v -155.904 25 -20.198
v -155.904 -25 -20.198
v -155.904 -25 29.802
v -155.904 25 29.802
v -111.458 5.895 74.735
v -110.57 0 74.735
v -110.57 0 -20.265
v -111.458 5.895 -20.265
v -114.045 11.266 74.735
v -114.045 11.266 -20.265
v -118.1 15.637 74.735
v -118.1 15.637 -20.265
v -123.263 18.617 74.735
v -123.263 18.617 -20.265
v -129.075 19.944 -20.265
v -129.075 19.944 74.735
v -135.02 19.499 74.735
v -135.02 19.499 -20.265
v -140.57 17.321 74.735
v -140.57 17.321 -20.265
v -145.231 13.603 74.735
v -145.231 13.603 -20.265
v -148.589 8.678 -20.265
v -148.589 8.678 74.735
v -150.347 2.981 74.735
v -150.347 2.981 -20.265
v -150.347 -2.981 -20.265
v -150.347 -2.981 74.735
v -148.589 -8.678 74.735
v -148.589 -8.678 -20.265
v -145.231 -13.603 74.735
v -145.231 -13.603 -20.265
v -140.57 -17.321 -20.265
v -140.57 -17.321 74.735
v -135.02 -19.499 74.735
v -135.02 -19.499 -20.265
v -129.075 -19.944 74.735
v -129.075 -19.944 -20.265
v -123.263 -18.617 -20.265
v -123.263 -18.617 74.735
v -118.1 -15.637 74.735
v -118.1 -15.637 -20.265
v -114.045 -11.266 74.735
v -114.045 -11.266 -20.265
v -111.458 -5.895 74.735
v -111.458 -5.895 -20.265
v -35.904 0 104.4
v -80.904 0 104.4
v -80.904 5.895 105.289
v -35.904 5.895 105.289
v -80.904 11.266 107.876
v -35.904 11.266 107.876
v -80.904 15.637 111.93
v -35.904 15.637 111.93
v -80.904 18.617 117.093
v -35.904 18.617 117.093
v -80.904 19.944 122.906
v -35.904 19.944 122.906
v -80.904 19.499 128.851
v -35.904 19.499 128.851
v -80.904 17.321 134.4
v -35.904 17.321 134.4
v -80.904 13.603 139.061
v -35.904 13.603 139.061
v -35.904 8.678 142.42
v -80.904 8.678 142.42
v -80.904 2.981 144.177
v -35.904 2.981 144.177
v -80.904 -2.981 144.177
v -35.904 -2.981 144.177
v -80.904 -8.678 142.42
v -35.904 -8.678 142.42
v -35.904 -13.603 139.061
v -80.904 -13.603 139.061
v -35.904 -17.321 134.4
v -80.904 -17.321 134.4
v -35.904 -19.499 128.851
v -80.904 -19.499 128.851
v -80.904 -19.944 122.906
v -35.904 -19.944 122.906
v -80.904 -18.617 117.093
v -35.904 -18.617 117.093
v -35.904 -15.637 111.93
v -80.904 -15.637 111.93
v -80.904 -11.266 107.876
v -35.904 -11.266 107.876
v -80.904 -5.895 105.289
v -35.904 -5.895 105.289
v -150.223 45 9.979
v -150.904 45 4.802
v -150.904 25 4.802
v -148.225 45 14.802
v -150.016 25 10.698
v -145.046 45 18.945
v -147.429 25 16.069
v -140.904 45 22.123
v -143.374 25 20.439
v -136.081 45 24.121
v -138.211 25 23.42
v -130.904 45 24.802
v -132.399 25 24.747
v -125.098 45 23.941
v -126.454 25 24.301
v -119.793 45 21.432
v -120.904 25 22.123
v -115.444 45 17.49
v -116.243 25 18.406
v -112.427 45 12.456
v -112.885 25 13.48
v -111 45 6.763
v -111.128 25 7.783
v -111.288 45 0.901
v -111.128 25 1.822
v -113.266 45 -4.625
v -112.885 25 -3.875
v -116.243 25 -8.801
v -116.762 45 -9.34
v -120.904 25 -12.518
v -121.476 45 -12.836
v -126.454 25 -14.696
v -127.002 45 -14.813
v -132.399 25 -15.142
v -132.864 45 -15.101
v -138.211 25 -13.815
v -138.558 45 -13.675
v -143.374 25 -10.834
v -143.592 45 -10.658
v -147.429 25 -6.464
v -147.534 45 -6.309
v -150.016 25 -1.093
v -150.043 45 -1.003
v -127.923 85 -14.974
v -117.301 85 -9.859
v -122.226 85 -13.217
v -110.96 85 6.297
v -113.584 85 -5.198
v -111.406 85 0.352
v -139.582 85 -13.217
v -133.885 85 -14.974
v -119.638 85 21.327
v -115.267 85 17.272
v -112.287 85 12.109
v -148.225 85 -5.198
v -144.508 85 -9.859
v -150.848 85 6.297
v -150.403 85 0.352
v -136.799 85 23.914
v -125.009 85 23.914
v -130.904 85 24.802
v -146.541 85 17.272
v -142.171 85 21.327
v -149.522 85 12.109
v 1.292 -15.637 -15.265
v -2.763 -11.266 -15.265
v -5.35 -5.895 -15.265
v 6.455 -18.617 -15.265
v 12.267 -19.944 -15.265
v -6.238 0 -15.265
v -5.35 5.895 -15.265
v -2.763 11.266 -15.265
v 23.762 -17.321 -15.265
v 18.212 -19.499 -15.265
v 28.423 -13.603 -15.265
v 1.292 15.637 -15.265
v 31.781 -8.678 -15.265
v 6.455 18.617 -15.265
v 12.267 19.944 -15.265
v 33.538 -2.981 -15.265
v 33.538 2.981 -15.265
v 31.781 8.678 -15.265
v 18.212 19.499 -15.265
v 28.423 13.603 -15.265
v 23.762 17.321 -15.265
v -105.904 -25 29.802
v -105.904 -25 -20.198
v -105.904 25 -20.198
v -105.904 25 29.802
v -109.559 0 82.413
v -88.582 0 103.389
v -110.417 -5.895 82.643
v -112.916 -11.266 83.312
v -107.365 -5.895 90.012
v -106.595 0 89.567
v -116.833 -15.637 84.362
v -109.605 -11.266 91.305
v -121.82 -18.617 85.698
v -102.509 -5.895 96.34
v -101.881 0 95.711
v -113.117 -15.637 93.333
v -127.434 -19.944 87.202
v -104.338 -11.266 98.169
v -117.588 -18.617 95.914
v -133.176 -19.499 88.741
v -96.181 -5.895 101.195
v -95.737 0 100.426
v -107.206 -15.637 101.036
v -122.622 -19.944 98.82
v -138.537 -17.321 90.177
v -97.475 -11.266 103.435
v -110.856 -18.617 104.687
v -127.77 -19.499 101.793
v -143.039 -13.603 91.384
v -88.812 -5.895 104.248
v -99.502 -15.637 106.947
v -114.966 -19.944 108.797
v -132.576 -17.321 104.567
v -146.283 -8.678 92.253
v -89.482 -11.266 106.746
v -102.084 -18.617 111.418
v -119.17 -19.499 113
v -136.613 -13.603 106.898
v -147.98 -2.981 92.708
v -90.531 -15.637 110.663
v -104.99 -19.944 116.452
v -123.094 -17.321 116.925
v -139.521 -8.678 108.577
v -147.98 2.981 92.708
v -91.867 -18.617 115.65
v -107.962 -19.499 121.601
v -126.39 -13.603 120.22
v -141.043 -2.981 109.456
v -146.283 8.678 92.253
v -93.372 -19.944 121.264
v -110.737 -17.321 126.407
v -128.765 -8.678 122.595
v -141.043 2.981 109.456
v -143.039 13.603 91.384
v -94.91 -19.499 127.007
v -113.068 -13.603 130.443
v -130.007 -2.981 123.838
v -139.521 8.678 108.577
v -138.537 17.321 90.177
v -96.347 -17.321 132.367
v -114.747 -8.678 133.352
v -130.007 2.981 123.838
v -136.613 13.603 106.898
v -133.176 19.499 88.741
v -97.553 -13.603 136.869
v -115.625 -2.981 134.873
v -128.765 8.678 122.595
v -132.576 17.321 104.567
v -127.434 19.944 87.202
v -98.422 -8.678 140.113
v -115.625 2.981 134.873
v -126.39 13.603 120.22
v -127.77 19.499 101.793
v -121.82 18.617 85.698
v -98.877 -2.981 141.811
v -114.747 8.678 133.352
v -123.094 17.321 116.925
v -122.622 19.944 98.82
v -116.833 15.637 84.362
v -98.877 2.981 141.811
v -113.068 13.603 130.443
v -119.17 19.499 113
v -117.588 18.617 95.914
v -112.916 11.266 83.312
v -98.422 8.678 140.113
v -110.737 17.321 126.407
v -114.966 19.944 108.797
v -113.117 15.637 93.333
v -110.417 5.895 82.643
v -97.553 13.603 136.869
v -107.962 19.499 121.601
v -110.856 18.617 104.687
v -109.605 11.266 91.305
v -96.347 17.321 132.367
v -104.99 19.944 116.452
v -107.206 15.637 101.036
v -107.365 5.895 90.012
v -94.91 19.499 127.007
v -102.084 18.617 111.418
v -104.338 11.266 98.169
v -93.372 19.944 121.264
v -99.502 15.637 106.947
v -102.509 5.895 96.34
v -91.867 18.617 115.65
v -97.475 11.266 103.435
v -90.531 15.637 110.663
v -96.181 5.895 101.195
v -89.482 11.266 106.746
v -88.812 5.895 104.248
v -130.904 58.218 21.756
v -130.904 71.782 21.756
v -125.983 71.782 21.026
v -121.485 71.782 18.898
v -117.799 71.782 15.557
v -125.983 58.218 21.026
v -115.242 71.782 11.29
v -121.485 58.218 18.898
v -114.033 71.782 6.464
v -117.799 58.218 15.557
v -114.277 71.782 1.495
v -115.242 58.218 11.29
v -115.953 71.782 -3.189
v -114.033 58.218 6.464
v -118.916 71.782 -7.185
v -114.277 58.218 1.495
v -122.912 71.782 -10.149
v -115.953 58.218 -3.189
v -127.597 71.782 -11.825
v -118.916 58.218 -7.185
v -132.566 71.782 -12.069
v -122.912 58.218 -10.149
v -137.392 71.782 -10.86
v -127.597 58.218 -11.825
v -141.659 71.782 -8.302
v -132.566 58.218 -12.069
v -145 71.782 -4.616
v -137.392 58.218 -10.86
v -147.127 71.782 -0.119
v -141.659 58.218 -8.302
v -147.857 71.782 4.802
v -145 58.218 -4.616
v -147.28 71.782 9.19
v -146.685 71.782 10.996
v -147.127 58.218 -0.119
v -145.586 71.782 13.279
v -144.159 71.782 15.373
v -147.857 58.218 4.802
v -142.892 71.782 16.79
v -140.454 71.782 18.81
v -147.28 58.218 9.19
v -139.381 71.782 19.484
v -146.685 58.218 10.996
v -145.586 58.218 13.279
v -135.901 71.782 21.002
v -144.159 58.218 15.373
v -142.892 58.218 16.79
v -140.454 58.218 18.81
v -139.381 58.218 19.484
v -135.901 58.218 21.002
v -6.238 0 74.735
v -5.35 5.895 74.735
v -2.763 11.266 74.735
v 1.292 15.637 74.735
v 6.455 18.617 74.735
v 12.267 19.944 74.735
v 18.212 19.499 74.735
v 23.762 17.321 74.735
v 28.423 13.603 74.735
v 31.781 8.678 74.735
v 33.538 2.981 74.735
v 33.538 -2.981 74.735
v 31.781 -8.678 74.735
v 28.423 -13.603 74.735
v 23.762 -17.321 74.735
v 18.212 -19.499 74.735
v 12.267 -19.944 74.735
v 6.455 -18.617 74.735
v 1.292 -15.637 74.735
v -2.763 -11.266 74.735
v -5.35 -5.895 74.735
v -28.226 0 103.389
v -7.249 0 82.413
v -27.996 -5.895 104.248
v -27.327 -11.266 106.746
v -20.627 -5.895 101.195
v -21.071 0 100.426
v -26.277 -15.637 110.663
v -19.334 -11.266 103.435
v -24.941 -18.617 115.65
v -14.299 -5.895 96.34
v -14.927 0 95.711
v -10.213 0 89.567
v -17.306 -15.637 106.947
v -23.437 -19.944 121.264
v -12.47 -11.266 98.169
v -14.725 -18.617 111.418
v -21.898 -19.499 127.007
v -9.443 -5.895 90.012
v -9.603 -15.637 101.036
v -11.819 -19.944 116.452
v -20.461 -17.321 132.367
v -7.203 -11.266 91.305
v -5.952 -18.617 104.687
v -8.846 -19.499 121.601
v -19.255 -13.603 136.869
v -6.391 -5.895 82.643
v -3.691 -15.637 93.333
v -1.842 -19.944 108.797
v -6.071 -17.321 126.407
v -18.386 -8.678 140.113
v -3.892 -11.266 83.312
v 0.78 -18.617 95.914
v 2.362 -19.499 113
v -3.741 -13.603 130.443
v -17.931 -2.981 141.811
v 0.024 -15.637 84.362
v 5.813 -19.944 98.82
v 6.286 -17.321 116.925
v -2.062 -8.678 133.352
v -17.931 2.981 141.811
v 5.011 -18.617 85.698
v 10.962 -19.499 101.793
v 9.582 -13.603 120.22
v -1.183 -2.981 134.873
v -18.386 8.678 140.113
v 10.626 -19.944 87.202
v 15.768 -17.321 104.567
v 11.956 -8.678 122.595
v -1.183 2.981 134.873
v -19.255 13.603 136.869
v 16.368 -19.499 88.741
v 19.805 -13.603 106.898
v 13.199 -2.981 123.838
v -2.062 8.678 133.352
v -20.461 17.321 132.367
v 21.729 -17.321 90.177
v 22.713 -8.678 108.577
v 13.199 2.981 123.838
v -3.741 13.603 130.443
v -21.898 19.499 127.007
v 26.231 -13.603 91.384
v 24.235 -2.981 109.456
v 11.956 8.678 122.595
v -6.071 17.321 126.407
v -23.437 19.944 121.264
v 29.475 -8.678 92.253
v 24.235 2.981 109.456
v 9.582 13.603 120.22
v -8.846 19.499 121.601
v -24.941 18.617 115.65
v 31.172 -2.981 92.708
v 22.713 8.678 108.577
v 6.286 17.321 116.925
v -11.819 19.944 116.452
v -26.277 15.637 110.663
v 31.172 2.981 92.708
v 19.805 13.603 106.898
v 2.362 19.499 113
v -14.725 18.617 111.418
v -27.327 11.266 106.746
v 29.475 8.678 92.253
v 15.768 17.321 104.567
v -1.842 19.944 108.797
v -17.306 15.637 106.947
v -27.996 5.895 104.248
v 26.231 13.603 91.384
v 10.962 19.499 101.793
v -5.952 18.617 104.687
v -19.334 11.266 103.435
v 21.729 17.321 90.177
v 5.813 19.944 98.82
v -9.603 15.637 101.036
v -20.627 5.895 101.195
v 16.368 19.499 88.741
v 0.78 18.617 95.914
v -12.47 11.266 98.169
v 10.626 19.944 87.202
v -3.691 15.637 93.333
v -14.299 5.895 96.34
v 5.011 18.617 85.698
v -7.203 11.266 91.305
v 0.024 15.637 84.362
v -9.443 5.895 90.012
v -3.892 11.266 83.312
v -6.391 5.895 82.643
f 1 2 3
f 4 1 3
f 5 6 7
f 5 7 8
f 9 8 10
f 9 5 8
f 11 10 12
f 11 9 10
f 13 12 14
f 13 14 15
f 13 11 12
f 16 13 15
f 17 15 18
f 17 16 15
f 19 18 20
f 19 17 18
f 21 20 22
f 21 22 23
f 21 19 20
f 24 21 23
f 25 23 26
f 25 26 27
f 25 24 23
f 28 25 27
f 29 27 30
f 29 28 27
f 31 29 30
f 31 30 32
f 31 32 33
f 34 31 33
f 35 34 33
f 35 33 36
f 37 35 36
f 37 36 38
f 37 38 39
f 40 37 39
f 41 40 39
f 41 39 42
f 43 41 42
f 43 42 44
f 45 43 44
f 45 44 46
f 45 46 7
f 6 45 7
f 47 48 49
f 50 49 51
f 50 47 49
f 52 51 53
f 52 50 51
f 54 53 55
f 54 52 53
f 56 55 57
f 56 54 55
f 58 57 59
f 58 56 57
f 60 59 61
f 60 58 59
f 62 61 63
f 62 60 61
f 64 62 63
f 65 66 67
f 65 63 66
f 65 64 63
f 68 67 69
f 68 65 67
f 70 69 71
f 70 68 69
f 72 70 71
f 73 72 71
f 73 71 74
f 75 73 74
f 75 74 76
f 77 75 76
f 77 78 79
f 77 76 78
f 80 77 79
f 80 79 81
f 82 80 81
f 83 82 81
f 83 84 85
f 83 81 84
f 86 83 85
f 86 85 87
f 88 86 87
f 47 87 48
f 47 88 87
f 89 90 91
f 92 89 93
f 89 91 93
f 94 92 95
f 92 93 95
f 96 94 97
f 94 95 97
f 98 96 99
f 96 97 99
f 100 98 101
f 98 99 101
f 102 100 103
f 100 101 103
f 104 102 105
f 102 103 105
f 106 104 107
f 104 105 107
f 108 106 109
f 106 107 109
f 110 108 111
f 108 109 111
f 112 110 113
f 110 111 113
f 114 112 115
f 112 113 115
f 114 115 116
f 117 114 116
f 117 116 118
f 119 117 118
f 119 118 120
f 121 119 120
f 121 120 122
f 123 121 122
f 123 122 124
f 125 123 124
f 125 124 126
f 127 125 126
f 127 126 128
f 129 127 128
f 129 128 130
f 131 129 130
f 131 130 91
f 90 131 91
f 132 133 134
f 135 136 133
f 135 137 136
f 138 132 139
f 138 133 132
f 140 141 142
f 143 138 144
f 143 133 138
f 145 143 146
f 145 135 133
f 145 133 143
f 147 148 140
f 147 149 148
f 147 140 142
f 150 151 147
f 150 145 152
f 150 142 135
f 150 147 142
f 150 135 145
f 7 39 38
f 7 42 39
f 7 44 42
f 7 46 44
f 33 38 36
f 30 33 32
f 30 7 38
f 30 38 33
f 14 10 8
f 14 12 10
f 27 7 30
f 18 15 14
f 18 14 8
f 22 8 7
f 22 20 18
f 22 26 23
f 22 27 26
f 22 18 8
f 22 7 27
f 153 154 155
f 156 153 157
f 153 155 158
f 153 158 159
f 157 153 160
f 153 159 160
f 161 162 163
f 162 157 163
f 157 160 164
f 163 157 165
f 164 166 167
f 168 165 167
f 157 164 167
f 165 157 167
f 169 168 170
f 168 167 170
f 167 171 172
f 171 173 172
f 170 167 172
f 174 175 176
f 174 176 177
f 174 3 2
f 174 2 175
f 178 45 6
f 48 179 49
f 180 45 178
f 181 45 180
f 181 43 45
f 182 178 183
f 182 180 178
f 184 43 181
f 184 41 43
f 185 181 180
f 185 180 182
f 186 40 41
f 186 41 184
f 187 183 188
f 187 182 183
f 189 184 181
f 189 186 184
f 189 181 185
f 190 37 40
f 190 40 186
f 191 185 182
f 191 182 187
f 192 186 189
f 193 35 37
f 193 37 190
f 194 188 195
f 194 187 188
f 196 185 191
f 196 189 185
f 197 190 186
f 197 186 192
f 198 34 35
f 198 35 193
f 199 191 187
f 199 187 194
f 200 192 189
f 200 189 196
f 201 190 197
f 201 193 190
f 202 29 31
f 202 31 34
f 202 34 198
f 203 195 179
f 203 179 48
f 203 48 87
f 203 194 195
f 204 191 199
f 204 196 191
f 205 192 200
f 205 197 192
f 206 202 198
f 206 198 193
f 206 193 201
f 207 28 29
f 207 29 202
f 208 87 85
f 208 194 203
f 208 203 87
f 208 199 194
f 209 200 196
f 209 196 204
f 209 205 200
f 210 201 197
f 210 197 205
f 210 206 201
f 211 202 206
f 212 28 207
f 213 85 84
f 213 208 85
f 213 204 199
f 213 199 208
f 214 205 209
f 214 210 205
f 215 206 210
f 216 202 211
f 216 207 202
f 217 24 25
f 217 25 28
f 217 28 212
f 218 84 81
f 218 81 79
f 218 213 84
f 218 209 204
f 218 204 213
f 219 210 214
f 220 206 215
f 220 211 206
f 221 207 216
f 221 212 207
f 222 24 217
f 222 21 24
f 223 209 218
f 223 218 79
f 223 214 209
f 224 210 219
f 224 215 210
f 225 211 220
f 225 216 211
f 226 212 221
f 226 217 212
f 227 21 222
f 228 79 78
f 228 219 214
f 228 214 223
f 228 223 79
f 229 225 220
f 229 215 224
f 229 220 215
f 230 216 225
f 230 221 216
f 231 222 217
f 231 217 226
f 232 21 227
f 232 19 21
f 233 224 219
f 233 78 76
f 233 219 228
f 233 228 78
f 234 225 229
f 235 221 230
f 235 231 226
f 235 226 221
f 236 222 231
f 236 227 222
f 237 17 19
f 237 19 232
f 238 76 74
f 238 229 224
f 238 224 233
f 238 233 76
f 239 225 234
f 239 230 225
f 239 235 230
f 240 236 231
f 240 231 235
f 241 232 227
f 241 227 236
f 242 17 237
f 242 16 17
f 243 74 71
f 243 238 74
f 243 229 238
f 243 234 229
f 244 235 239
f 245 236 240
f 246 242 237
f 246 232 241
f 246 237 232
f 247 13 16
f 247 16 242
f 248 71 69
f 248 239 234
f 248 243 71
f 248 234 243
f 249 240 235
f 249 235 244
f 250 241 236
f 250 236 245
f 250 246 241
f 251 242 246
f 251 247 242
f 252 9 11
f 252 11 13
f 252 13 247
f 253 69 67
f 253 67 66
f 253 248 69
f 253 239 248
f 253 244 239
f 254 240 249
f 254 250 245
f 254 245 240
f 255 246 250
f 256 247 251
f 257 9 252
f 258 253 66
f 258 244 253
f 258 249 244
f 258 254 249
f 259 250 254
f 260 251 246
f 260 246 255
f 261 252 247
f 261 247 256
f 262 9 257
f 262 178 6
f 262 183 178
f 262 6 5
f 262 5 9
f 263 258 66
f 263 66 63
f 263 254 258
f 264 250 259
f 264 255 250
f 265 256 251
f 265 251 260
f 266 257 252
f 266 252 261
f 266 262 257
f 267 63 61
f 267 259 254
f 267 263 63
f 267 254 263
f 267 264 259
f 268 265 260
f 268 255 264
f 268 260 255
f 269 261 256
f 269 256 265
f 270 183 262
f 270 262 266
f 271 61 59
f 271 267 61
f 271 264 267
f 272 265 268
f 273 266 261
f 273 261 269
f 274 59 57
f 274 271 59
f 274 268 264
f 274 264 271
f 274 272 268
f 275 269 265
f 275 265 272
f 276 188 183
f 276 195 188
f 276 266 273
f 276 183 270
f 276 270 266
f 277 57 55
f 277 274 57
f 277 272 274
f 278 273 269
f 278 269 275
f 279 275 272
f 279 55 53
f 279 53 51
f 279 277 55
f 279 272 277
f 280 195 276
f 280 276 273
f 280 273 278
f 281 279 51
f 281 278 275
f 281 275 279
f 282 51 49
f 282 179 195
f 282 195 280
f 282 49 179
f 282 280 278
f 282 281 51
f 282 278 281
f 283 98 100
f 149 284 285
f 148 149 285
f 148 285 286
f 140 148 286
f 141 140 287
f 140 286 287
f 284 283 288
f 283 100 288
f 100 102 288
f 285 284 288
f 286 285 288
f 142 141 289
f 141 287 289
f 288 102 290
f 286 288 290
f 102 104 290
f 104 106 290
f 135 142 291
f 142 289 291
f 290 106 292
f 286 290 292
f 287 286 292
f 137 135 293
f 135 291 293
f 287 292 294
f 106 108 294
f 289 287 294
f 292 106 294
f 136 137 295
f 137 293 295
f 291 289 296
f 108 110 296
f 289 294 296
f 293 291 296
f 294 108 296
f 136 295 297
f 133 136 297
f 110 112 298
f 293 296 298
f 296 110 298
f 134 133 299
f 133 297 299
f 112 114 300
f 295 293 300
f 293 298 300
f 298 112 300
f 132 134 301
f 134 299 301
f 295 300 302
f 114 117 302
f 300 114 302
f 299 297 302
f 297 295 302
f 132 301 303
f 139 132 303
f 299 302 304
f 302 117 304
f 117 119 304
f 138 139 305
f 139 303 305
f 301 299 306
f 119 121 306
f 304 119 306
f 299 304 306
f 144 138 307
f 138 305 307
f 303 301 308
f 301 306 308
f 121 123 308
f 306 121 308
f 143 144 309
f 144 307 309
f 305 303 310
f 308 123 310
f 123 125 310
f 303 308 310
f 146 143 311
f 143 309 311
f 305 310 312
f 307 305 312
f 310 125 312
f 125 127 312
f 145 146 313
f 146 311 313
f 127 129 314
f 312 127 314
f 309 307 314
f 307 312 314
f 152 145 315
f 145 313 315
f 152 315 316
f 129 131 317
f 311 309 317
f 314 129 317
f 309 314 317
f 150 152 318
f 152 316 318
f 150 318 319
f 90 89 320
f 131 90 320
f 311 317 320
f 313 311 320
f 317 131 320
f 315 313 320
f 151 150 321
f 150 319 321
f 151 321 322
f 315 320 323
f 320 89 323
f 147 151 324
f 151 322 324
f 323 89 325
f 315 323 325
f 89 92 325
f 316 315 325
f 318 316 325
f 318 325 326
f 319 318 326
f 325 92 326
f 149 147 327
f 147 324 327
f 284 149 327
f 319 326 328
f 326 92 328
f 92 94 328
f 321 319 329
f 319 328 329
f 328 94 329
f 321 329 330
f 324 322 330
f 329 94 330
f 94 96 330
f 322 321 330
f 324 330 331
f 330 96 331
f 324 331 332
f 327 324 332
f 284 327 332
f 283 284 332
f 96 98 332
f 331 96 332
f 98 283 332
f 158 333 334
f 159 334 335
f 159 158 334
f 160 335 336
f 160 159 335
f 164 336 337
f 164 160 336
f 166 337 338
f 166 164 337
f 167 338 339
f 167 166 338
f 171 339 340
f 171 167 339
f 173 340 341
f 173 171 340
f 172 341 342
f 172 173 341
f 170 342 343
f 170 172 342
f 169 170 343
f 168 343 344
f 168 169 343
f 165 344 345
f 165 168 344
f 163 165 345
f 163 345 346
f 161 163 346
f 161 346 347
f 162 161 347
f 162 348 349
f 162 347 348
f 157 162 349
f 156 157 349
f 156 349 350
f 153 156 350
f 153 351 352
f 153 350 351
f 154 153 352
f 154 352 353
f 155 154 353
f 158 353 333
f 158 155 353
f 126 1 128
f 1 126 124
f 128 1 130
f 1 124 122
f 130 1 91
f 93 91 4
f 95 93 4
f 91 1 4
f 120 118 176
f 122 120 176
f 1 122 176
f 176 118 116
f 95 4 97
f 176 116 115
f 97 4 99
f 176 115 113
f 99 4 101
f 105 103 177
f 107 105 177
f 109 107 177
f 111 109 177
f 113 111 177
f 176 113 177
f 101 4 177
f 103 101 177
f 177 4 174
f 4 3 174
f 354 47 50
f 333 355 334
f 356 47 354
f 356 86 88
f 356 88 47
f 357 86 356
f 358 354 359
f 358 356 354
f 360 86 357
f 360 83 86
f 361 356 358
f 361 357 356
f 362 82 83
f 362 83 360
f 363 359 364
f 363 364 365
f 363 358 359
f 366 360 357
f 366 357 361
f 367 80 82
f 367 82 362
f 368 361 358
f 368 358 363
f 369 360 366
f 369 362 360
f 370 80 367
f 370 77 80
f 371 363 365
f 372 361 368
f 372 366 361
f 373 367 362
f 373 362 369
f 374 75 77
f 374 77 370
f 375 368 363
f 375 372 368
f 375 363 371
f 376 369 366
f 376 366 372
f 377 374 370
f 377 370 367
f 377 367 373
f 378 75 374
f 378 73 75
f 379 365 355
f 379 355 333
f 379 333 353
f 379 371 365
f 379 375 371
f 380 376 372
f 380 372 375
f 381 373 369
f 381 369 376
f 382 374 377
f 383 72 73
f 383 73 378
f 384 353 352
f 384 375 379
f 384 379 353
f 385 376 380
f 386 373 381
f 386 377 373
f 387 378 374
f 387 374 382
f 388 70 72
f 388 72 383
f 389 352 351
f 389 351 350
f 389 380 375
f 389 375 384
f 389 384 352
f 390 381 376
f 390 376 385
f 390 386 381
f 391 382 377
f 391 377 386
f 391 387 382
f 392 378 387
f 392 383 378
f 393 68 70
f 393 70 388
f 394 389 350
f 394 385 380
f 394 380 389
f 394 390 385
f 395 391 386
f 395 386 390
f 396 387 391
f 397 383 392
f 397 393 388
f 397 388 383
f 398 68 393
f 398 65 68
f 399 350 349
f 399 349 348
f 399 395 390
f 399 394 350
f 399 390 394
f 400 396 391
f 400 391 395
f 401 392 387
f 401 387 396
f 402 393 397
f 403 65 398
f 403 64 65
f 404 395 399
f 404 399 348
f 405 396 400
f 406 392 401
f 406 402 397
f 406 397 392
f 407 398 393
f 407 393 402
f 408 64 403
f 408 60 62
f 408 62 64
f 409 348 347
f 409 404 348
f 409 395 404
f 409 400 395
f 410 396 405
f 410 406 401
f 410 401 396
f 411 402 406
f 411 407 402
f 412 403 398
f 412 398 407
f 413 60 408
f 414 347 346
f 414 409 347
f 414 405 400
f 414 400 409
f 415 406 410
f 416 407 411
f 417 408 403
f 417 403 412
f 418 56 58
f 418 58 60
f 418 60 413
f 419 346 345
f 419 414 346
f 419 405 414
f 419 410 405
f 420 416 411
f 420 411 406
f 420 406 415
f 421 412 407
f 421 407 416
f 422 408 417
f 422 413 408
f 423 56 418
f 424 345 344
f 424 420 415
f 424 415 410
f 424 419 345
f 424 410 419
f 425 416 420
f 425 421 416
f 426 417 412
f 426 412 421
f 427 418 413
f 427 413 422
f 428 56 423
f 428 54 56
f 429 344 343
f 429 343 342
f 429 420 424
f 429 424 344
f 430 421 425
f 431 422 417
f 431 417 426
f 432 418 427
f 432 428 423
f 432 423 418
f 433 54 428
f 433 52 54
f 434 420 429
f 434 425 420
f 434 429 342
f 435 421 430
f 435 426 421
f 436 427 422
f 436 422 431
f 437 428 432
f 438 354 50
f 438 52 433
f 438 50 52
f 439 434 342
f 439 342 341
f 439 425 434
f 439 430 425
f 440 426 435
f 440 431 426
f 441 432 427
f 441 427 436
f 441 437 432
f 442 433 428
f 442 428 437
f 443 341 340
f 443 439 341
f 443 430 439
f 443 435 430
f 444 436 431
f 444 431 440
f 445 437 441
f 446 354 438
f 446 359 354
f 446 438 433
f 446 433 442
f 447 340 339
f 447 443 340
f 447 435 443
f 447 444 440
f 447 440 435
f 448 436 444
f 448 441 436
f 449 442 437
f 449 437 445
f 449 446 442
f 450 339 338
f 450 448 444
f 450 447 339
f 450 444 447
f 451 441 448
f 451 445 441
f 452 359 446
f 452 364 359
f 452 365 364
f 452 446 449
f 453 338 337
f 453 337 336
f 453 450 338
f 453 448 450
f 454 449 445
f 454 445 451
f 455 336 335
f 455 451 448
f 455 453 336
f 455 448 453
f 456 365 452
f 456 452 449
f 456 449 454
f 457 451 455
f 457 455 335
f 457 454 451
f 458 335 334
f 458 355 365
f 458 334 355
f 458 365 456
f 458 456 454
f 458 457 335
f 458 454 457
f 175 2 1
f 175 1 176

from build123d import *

# Parameters (mm, degrees)
F1_W          = 50
F1_H          = 50
F2_DEPTH      = 25
F2_DEPTH_BACK = 25
F3_R          = 20
F5_R          = 20
F6_DEPTH      = 60


with BuildPart() as f2:
    # F1 (on Front) → F2 (new body, two sides)
    with BuildSketch(Plane.XZ) as f2_sk:
        with Locations((-130.9041270614, 4.8024594039)):
            Rectangle(F1_W, F1_H)
    extrude(amount=F2_DEPTH)
    extrude(f2_sk.sketch, amount=-F2_DEPTH_BACK)

    # F5 (on face) → F6 (join)
    with BuildSketch(Plane(origin=(0, 25, 0), x_dir=(-1, 0, 0), z_dir=(0, 1, 0))):
        with Locations((130.9041270614, 4.8024594039)):
            Circle(F5_R)
    extrude(amount=F6_DEPTH)

    # F8 (on offset) → F9 (revolve, cut)
    with BuildSketch(Plane(origin=(-130.9041270614, 0, 0), x_dir=(0, -1, 0), z_dir=(-1, 0, 0))):
        with BuildLine():
            Line((-45, 24.8024594039), (-85, 24.8024594039))
            ThreePointArc((-85, 24.8024594039), (-65, 21.3710018988), (-45, 24.8024594039))
        make_face()
    revolve(axis=Axis((-130.9041270614, 85, 4.8024594039), (0, 1, 0)), mode=Mode.SUBTRACT)


with BuildPart() as f4:
    # F4: sweep along a path in F0
    with BuildLine(Plane.XZ) as f4_path:
        Line((-130.9041270614, -20.2654755116), (-130.9041270614, 74.7345244884))
        ThreePointArc((-130.9041270614, 74.7345244884), (-116.2594661207, 110.0898635478), (-80.9041270614, 124.7345244884))
        Line((-80.9041270614, 124.7345244884), (-35.9041270614, 124.7345244884))
        ThreePointArc((-35.9041270614, 124.7345244884), (-0.548788002, 110.0898635478), (14.0958729386, 74.7345244884))
        Line((14.0958729386, 74.7345244884), (14.0958729386, -15.2654755116))
    # F3 (on face) → F4 (sweep)
    with BuildSketch(Plane(origin=(0, 0, -20.1975405961), x_dir=(1, 0, 0), z_dir=(0, 0, -1))):
        with Locations((-130.5698901415, 0)):
            Circle(F3_R)
    sweep(path=f4_path.line)


solid = Compound([f2.part, f4.part])
